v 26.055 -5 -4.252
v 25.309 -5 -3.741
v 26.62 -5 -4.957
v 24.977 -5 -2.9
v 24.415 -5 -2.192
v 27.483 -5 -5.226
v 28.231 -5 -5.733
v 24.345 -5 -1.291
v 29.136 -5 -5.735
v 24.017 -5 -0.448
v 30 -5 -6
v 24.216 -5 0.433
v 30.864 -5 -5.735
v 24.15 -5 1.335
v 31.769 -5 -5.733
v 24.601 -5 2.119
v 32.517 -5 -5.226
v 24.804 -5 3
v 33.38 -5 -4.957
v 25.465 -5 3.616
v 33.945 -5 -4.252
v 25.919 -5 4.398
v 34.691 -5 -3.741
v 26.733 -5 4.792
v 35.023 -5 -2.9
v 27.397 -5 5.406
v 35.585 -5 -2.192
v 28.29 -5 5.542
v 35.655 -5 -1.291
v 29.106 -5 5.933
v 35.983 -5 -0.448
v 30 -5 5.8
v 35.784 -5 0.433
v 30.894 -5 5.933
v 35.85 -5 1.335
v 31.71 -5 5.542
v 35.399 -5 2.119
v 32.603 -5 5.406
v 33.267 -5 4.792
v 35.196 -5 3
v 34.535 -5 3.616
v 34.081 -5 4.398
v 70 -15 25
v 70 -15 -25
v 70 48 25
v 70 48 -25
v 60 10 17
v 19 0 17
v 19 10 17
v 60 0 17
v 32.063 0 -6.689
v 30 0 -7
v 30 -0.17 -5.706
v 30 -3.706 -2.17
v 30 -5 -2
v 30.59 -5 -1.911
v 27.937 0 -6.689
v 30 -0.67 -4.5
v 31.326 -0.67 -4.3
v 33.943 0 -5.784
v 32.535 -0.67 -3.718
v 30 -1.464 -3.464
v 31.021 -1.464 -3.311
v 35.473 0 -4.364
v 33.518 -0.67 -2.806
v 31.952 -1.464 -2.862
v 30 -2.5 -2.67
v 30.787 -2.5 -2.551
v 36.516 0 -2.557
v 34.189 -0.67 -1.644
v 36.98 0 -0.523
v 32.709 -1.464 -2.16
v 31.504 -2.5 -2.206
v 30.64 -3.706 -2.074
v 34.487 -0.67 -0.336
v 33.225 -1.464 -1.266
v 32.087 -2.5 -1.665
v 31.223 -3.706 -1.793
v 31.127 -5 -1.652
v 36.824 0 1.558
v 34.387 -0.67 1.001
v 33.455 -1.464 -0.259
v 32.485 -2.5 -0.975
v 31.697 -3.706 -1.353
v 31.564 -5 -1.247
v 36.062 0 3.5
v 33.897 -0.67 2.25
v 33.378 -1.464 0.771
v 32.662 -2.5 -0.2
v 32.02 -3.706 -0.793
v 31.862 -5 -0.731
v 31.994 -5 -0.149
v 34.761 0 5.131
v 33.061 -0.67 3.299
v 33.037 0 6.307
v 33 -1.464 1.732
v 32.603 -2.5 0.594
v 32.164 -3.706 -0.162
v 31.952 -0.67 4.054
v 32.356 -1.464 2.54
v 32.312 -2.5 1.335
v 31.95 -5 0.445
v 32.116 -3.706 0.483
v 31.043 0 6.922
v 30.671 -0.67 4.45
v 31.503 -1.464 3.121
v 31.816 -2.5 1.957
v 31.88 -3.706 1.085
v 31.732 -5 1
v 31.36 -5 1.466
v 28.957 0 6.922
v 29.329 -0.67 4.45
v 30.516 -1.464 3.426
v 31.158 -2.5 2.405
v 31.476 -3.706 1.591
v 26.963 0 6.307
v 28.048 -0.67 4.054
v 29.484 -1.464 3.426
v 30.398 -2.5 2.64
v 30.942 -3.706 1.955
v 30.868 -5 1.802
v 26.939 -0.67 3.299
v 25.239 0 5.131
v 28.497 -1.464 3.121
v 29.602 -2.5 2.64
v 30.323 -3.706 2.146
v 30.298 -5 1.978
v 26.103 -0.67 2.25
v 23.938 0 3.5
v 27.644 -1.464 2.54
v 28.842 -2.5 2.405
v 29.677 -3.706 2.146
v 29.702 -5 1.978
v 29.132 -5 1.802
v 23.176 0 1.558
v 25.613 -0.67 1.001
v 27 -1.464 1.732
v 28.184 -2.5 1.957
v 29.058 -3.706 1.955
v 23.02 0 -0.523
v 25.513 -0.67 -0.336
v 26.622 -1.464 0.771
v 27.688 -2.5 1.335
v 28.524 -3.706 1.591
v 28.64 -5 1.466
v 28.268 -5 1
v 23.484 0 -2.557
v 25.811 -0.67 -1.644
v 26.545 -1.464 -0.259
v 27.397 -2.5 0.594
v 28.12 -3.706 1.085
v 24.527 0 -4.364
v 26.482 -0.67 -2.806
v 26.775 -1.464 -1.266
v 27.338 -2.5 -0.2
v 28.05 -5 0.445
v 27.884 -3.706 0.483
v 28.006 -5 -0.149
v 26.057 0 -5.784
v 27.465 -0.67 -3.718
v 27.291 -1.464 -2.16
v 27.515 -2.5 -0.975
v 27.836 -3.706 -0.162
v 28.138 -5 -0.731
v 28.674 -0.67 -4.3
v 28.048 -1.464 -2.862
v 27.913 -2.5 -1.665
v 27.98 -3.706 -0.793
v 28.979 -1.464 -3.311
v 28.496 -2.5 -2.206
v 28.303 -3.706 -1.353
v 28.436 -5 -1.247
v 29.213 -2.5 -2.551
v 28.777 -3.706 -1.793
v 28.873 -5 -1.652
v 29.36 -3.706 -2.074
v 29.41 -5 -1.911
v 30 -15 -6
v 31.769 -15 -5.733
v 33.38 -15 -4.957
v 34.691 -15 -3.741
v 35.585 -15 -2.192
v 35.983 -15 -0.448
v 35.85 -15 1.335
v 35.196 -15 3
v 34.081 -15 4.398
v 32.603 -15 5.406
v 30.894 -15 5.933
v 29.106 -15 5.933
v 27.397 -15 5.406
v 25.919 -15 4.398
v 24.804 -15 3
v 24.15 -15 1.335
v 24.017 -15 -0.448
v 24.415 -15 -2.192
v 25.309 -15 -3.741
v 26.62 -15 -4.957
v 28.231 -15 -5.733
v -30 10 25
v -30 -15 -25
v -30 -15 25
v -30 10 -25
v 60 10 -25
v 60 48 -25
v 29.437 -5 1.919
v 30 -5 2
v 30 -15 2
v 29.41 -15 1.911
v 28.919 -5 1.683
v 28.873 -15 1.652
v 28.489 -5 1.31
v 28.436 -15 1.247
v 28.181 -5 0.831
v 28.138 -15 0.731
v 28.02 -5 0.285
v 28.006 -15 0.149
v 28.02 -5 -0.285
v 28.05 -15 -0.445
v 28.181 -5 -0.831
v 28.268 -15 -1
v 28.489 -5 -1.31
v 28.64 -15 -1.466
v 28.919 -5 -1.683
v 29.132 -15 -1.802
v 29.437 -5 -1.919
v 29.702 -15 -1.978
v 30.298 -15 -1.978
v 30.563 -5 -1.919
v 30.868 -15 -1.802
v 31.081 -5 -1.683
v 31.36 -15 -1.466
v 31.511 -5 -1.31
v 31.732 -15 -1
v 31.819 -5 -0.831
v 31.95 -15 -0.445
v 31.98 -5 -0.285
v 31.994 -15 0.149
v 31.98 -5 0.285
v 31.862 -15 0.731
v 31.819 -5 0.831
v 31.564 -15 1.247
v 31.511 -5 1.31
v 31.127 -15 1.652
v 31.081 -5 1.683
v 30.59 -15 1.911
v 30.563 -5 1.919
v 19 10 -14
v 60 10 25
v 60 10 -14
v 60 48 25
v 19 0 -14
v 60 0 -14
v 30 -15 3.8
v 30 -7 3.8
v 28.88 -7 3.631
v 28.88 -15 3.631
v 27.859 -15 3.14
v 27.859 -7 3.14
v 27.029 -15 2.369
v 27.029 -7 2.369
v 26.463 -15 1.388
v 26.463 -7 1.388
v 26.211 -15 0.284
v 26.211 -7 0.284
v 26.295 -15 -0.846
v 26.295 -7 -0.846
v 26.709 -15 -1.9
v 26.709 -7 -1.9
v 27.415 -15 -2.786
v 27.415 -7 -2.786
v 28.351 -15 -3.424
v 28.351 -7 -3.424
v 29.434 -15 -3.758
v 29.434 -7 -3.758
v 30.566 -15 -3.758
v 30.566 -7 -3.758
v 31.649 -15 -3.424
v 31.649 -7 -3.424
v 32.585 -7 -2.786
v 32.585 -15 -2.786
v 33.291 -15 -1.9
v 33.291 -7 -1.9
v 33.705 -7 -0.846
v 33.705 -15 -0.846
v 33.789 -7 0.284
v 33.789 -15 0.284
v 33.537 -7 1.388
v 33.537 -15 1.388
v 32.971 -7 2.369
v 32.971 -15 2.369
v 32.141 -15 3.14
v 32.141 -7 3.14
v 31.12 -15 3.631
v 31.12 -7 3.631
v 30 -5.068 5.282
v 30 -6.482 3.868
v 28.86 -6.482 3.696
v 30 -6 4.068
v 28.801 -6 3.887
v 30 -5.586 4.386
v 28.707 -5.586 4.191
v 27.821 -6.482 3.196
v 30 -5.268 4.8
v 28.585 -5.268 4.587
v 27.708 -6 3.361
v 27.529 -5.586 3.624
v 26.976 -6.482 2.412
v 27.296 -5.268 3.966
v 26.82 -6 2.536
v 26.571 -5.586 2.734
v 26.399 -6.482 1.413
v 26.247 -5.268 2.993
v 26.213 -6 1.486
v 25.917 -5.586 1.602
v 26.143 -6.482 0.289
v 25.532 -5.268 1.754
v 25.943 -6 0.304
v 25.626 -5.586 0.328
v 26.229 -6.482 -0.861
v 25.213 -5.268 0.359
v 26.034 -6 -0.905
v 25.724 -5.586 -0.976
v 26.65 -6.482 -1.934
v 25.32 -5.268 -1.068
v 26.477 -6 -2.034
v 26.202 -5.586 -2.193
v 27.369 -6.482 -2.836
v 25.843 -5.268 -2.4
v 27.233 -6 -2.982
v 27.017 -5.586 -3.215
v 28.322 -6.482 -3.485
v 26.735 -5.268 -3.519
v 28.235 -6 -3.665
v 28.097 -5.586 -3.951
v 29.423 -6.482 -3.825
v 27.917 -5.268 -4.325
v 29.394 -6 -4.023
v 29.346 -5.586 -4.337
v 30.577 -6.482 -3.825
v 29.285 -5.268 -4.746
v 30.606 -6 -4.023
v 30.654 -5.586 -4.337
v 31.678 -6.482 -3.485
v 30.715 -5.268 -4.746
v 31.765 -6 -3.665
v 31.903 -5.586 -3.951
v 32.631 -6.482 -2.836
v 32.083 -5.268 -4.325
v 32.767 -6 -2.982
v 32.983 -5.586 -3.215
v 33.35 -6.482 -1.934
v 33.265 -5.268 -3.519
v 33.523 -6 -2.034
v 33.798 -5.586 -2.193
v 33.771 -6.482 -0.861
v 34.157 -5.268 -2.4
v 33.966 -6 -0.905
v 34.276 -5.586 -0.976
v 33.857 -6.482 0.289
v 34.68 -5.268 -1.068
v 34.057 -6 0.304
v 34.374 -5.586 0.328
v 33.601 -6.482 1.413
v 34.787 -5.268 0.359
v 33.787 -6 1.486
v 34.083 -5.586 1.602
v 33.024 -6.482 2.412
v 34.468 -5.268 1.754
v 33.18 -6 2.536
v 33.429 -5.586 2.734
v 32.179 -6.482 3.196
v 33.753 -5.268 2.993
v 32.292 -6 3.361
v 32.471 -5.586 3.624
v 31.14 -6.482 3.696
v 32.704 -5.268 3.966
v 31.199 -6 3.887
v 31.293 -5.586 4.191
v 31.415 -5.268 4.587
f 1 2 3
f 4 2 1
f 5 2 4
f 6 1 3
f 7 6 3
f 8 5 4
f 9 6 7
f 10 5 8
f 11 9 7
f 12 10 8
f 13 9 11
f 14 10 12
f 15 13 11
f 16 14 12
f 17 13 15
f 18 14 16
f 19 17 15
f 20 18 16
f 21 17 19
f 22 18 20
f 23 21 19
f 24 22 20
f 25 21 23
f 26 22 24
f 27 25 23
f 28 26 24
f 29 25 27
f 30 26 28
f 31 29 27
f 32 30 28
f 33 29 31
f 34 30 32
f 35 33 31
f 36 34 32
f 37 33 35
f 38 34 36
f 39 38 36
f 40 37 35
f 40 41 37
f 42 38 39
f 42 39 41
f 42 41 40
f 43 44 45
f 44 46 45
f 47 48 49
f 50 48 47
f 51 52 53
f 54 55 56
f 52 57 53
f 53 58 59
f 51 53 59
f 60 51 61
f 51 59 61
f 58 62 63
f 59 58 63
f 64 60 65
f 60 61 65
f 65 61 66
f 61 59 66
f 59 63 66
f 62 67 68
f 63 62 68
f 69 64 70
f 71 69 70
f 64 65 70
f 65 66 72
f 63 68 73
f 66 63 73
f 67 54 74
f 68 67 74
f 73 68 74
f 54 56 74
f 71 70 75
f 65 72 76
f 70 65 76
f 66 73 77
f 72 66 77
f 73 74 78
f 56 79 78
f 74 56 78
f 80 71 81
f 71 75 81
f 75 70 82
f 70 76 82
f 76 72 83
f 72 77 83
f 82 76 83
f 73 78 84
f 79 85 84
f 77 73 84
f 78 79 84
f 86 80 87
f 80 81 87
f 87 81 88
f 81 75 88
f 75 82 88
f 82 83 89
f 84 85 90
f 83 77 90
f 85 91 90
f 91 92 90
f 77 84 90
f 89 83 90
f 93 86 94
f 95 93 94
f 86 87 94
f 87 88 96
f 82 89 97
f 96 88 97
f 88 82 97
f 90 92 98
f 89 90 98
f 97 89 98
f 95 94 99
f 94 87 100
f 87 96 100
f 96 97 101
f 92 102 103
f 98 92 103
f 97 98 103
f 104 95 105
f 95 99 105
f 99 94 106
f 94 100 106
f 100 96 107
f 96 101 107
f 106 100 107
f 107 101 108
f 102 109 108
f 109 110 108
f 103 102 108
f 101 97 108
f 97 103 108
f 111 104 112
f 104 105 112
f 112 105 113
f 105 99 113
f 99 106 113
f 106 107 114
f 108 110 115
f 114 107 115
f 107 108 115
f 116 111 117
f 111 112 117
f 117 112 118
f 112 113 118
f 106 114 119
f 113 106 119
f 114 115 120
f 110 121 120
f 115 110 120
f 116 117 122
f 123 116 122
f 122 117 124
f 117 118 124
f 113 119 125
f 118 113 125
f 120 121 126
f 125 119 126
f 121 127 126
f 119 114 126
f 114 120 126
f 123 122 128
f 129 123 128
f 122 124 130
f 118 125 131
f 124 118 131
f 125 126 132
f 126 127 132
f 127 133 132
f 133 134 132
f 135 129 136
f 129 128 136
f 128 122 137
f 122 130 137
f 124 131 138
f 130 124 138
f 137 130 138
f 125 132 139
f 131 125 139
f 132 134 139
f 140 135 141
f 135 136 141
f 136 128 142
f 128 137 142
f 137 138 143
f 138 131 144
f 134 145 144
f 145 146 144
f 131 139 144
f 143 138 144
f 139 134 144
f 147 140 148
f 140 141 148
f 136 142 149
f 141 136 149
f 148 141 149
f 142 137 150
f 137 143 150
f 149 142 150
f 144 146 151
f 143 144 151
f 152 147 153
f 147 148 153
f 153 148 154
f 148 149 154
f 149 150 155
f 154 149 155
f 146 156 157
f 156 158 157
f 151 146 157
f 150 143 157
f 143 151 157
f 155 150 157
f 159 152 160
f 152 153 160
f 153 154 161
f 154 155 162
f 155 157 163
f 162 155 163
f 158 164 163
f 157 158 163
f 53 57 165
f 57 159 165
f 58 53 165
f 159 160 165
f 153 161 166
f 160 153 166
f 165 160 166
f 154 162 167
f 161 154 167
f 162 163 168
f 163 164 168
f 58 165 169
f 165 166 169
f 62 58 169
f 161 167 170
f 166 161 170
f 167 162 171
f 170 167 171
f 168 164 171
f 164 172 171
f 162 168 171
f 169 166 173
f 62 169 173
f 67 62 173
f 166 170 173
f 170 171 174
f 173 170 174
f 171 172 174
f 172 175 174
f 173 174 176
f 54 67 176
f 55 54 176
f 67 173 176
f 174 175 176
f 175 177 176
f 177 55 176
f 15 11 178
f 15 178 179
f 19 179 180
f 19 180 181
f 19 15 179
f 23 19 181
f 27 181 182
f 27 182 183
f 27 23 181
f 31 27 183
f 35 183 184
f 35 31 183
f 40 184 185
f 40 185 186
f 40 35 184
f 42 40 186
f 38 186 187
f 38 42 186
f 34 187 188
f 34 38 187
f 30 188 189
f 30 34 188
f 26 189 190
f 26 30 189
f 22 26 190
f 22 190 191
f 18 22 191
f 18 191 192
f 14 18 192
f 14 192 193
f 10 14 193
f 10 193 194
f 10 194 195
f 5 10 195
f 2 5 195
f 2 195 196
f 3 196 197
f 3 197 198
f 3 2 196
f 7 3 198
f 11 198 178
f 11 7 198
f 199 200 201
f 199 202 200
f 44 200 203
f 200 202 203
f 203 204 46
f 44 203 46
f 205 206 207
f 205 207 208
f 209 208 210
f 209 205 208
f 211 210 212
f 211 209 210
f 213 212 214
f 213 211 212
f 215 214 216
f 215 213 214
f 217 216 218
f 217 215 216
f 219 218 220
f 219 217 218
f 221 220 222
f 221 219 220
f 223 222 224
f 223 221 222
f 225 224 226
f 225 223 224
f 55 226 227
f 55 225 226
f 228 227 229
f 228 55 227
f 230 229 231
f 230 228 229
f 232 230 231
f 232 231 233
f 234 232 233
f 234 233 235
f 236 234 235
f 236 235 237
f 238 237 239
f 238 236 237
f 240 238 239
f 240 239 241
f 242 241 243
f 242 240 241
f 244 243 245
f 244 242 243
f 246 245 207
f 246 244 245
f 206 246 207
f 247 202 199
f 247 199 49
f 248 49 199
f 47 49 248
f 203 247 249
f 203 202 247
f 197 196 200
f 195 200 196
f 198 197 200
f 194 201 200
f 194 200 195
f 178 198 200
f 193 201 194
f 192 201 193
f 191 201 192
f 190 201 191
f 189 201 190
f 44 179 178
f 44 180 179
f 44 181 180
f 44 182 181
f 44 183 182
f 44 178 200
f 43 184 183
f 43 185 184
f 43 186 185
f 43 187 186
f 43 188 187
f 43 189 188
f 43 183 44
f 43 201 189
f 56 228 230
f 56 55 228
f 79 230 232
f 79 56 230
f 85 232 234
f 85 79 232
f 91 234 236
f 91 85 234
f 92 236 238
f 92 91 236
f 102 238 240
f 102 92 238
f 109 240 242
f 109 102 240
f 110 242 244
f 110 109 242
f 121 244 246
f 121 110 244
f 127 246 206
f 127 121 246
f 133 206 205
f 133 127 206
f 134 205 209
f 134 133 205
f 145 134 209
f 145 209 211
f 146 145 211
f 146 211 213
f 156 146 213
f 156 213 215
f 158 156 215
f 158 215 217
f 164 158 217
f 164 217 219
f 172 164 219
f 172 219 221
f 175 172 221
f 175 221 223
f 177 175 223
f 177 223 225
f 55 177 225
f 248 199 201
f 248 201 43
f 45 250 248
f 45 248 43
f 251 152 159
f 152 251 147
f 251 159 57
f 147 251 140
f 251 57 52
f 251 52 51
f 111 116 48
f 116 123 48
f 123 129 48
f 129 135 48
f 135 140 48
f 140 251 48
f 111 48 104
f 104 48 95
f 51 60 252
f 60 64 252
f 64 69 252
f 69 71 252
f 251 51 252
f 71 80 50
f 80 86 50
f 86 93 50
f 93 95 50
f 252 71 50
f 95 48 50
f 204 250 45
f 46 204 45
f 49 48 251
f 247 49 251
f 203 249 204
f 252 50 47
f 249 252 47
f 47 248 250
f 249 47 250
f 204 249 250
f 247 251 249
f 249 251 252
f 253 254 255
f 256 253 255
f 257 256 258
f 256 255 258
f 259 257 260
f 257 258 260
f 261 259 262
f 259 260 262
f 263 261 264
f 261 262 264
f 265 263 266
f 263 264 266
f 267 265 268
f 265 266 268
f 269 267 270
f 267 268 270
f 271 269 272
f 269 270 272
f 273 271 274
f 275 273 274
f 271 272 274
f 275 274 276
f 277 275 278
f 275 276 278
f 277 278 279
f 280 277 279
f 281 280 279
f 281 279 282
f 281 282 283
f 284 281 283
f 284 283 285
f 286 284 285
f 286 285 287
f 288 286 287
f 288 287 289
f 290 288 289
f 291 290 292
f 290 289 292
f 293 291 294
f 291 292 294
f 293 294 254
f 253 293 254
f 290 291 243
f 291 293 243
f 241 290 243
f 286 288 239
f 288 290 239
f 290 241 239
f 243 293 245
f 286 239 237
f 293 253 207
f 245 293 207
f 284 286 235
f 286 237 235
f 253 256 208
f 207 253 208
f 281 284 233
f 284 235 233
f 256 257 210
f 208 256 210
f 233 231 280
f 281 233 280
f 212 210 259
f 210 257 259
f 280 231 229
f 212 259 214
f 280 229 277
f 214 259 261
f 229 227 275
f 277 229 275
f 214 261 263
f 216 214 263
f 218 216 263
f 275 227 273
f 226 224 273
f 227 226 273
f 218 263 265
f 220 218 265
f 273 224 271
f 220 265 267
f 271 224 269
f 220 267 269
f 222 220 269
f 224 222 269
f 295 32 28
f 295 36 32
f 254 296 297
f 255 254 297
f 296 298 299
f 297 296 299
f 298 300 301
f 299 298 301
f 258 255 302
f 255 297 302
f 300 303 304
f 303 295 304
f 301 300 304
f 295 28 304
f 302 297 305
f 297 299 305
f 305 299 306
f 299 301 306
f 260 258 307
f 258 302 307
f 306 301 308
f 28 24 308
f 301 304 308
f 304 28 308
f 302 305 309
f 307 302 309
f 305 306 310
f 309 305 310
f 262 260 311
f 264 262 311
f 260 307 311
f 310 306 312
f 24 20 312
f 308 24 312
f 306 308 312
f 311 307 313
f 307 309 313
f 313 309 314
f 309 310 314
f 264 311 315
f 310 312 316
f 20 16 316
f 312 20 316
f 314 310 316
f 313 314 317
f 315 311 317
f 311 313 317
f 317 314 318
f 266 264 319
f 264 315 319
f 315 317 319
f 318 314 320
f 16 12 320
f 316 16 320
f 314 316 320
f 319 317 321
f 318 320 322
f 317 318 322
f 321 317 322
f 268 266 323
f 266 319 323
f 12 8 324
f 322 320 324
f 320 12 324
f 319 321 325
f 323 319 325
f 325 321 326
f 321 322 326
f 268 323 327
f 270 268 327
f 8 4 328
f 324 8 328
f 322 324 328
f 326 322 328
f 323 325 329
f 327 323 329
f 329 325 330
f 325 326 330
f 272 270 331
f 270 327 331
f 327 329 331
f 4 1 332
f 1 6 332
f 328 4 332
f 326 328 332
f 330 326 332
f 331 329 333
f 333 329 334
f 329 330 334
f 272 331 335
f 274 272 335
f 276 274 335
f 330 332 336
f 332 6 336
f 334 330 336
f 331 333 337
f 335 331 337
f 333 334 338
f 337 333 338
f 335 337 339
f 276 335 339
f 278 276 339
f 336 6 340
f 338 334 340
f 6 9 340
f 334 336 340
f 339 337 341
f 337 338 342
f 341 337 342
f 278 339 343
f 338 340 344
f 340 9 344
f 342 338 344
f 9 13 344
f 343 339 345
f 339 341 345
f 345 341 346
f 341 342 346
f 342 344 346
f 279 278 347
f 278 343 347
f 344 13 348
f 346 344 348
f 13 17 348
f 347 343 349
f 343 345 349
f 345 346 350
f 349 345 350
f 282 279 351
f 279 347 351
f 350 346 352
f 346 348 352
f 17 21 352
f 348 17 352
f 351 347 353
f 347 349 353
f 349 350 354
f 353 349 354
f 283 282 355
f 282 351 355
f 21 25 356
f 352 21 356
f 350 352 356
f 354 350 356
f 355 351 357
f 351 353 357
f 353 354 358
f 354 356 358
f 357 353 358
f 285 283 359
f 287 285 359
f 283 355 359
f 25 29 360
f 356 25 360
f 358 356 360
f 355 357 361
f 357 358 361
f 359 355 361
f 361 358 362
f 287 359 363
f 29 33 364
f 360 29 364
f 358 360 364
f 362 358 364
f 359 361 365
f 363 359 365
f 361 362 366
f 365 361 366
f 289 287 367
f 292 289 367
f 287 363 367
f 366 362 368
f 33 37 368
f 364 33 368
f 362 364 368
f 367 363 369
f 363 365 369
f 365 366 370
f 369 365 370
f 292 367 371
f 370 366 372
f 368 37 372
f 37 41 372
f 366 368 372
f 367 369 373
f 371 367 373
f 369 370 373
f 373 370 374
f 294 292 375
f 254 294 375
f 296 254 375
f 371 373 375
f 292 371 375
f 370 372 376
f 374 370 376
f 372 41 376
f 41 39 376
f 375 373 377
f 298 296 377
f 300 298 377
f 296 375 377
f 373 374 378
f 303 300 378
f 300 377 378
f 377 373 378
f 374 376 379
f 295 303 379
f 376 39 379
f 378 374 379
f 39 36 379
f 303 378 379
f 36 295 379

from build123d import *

# Parameters (mm, degrees)
SKETCH1_W           = 100
SKETCH1_H           = 50
SKETCH1_W_2         = 41
SKETCH1_H_2         = 31
BOSS_EXTRUDE1_DEPTH = 10
SKETCH2_W           = 10
SKETCH2_H           = 38
BOSS_EXTRUDE2_DEPTH = 50
SKETCH10_W          = 100
SKETCH10_H          = 50
SKETCH10_R          = 2
BOSS_EXTRUDE6_DEPTH = 5
SKETCH12_W          = 1.8
SKETCH12_H          = 10
FILLET4_R           = 2
SKETCH13_W          = 100
SKETCH13_H          = 50
SKETCH13_R          = 6
BOSS_EXTRUDE7_DEPTH = 10
FILLET5_R           = 5


with BuildPart() as part:
    # Sketch1 → Boss-Extrude1 (new body)
    with BuildSketch(Plane(origin=(0, 0, 0), x_dir=(1, 0, 0), z_dir=(0, 1, 0))):
        with Locations((20, 0)):
            Rectangle(SKETCH1_W, SKETCH1_H)
        with Locations((39.5, -1.5)):
            Rectangle(SKETCH1_W_2, SKETCH1_H_2, mode=Mode.SUBTRACT)
    extrude(amount=BOSS_EXTRUDE1_DEPTH)

    # Sketch2 → Boss-Extrude2 (add)
    with BuildSketch(Plane.XY.offset(25)):
        with Locations((65, 29)):
            Rectangle(SKETCH2_W, SKETCH2_H)
    extrude(amount=-BOSS_EXTRUDE2_DEPTH)

    # Sketch10 → Boss-Extrude6 (add)
    with BuildSketch(Plane.XZ):
        with Locations((20, 0)):
            Rectangle(SKETCH10_W, SKETCH10_H)
        with Locations((30, 0)):
            Circle(SKETCH10_R, mode=Mode.SUBTRACT)
    extrude(amount=BOSS_EXTRUDE6_DEPTH)

    # Sketch12 → Revolve3 (revolve)
    with BuildSketch(Plane.XY):
        with Locations((32.9, -10)):
            Rectangle(SKETCH12_W, SKETCH12_H)
    revolve(axis=Axis((30, -5, 0), (0, -1, 0)))

    # Fillet4
    fillet4_edges = [part.edges().sort_by_distance(p)[0] for p in [
        (26.2, -5, 0),
    ]]
    fillet(fillet4_edges, radius=FILLET4_R)

    # Sketch13 → Boss-Extrude7 (add)
    with BuildSketch(Plane.XZ.offset(5)):
        with Locations((20, 0)):
            Rectangle(SKETCH13_W, SKETCH13_H)
        with Locations((30, 0)):
            Circle(SKETCH13_R, mode=Mode.SUBTRACT)
    extrude(amount=BOSS_EXTRUDE7_DEPTH)

    # Fillet5
    fillet5_edges = [part.edges().sort_by_distance(p)[0] for p in [
        (28, 0, 0),
    ]]
    fillet(fillet5_edges, radius=FILLET5_R)


solid = part.part
